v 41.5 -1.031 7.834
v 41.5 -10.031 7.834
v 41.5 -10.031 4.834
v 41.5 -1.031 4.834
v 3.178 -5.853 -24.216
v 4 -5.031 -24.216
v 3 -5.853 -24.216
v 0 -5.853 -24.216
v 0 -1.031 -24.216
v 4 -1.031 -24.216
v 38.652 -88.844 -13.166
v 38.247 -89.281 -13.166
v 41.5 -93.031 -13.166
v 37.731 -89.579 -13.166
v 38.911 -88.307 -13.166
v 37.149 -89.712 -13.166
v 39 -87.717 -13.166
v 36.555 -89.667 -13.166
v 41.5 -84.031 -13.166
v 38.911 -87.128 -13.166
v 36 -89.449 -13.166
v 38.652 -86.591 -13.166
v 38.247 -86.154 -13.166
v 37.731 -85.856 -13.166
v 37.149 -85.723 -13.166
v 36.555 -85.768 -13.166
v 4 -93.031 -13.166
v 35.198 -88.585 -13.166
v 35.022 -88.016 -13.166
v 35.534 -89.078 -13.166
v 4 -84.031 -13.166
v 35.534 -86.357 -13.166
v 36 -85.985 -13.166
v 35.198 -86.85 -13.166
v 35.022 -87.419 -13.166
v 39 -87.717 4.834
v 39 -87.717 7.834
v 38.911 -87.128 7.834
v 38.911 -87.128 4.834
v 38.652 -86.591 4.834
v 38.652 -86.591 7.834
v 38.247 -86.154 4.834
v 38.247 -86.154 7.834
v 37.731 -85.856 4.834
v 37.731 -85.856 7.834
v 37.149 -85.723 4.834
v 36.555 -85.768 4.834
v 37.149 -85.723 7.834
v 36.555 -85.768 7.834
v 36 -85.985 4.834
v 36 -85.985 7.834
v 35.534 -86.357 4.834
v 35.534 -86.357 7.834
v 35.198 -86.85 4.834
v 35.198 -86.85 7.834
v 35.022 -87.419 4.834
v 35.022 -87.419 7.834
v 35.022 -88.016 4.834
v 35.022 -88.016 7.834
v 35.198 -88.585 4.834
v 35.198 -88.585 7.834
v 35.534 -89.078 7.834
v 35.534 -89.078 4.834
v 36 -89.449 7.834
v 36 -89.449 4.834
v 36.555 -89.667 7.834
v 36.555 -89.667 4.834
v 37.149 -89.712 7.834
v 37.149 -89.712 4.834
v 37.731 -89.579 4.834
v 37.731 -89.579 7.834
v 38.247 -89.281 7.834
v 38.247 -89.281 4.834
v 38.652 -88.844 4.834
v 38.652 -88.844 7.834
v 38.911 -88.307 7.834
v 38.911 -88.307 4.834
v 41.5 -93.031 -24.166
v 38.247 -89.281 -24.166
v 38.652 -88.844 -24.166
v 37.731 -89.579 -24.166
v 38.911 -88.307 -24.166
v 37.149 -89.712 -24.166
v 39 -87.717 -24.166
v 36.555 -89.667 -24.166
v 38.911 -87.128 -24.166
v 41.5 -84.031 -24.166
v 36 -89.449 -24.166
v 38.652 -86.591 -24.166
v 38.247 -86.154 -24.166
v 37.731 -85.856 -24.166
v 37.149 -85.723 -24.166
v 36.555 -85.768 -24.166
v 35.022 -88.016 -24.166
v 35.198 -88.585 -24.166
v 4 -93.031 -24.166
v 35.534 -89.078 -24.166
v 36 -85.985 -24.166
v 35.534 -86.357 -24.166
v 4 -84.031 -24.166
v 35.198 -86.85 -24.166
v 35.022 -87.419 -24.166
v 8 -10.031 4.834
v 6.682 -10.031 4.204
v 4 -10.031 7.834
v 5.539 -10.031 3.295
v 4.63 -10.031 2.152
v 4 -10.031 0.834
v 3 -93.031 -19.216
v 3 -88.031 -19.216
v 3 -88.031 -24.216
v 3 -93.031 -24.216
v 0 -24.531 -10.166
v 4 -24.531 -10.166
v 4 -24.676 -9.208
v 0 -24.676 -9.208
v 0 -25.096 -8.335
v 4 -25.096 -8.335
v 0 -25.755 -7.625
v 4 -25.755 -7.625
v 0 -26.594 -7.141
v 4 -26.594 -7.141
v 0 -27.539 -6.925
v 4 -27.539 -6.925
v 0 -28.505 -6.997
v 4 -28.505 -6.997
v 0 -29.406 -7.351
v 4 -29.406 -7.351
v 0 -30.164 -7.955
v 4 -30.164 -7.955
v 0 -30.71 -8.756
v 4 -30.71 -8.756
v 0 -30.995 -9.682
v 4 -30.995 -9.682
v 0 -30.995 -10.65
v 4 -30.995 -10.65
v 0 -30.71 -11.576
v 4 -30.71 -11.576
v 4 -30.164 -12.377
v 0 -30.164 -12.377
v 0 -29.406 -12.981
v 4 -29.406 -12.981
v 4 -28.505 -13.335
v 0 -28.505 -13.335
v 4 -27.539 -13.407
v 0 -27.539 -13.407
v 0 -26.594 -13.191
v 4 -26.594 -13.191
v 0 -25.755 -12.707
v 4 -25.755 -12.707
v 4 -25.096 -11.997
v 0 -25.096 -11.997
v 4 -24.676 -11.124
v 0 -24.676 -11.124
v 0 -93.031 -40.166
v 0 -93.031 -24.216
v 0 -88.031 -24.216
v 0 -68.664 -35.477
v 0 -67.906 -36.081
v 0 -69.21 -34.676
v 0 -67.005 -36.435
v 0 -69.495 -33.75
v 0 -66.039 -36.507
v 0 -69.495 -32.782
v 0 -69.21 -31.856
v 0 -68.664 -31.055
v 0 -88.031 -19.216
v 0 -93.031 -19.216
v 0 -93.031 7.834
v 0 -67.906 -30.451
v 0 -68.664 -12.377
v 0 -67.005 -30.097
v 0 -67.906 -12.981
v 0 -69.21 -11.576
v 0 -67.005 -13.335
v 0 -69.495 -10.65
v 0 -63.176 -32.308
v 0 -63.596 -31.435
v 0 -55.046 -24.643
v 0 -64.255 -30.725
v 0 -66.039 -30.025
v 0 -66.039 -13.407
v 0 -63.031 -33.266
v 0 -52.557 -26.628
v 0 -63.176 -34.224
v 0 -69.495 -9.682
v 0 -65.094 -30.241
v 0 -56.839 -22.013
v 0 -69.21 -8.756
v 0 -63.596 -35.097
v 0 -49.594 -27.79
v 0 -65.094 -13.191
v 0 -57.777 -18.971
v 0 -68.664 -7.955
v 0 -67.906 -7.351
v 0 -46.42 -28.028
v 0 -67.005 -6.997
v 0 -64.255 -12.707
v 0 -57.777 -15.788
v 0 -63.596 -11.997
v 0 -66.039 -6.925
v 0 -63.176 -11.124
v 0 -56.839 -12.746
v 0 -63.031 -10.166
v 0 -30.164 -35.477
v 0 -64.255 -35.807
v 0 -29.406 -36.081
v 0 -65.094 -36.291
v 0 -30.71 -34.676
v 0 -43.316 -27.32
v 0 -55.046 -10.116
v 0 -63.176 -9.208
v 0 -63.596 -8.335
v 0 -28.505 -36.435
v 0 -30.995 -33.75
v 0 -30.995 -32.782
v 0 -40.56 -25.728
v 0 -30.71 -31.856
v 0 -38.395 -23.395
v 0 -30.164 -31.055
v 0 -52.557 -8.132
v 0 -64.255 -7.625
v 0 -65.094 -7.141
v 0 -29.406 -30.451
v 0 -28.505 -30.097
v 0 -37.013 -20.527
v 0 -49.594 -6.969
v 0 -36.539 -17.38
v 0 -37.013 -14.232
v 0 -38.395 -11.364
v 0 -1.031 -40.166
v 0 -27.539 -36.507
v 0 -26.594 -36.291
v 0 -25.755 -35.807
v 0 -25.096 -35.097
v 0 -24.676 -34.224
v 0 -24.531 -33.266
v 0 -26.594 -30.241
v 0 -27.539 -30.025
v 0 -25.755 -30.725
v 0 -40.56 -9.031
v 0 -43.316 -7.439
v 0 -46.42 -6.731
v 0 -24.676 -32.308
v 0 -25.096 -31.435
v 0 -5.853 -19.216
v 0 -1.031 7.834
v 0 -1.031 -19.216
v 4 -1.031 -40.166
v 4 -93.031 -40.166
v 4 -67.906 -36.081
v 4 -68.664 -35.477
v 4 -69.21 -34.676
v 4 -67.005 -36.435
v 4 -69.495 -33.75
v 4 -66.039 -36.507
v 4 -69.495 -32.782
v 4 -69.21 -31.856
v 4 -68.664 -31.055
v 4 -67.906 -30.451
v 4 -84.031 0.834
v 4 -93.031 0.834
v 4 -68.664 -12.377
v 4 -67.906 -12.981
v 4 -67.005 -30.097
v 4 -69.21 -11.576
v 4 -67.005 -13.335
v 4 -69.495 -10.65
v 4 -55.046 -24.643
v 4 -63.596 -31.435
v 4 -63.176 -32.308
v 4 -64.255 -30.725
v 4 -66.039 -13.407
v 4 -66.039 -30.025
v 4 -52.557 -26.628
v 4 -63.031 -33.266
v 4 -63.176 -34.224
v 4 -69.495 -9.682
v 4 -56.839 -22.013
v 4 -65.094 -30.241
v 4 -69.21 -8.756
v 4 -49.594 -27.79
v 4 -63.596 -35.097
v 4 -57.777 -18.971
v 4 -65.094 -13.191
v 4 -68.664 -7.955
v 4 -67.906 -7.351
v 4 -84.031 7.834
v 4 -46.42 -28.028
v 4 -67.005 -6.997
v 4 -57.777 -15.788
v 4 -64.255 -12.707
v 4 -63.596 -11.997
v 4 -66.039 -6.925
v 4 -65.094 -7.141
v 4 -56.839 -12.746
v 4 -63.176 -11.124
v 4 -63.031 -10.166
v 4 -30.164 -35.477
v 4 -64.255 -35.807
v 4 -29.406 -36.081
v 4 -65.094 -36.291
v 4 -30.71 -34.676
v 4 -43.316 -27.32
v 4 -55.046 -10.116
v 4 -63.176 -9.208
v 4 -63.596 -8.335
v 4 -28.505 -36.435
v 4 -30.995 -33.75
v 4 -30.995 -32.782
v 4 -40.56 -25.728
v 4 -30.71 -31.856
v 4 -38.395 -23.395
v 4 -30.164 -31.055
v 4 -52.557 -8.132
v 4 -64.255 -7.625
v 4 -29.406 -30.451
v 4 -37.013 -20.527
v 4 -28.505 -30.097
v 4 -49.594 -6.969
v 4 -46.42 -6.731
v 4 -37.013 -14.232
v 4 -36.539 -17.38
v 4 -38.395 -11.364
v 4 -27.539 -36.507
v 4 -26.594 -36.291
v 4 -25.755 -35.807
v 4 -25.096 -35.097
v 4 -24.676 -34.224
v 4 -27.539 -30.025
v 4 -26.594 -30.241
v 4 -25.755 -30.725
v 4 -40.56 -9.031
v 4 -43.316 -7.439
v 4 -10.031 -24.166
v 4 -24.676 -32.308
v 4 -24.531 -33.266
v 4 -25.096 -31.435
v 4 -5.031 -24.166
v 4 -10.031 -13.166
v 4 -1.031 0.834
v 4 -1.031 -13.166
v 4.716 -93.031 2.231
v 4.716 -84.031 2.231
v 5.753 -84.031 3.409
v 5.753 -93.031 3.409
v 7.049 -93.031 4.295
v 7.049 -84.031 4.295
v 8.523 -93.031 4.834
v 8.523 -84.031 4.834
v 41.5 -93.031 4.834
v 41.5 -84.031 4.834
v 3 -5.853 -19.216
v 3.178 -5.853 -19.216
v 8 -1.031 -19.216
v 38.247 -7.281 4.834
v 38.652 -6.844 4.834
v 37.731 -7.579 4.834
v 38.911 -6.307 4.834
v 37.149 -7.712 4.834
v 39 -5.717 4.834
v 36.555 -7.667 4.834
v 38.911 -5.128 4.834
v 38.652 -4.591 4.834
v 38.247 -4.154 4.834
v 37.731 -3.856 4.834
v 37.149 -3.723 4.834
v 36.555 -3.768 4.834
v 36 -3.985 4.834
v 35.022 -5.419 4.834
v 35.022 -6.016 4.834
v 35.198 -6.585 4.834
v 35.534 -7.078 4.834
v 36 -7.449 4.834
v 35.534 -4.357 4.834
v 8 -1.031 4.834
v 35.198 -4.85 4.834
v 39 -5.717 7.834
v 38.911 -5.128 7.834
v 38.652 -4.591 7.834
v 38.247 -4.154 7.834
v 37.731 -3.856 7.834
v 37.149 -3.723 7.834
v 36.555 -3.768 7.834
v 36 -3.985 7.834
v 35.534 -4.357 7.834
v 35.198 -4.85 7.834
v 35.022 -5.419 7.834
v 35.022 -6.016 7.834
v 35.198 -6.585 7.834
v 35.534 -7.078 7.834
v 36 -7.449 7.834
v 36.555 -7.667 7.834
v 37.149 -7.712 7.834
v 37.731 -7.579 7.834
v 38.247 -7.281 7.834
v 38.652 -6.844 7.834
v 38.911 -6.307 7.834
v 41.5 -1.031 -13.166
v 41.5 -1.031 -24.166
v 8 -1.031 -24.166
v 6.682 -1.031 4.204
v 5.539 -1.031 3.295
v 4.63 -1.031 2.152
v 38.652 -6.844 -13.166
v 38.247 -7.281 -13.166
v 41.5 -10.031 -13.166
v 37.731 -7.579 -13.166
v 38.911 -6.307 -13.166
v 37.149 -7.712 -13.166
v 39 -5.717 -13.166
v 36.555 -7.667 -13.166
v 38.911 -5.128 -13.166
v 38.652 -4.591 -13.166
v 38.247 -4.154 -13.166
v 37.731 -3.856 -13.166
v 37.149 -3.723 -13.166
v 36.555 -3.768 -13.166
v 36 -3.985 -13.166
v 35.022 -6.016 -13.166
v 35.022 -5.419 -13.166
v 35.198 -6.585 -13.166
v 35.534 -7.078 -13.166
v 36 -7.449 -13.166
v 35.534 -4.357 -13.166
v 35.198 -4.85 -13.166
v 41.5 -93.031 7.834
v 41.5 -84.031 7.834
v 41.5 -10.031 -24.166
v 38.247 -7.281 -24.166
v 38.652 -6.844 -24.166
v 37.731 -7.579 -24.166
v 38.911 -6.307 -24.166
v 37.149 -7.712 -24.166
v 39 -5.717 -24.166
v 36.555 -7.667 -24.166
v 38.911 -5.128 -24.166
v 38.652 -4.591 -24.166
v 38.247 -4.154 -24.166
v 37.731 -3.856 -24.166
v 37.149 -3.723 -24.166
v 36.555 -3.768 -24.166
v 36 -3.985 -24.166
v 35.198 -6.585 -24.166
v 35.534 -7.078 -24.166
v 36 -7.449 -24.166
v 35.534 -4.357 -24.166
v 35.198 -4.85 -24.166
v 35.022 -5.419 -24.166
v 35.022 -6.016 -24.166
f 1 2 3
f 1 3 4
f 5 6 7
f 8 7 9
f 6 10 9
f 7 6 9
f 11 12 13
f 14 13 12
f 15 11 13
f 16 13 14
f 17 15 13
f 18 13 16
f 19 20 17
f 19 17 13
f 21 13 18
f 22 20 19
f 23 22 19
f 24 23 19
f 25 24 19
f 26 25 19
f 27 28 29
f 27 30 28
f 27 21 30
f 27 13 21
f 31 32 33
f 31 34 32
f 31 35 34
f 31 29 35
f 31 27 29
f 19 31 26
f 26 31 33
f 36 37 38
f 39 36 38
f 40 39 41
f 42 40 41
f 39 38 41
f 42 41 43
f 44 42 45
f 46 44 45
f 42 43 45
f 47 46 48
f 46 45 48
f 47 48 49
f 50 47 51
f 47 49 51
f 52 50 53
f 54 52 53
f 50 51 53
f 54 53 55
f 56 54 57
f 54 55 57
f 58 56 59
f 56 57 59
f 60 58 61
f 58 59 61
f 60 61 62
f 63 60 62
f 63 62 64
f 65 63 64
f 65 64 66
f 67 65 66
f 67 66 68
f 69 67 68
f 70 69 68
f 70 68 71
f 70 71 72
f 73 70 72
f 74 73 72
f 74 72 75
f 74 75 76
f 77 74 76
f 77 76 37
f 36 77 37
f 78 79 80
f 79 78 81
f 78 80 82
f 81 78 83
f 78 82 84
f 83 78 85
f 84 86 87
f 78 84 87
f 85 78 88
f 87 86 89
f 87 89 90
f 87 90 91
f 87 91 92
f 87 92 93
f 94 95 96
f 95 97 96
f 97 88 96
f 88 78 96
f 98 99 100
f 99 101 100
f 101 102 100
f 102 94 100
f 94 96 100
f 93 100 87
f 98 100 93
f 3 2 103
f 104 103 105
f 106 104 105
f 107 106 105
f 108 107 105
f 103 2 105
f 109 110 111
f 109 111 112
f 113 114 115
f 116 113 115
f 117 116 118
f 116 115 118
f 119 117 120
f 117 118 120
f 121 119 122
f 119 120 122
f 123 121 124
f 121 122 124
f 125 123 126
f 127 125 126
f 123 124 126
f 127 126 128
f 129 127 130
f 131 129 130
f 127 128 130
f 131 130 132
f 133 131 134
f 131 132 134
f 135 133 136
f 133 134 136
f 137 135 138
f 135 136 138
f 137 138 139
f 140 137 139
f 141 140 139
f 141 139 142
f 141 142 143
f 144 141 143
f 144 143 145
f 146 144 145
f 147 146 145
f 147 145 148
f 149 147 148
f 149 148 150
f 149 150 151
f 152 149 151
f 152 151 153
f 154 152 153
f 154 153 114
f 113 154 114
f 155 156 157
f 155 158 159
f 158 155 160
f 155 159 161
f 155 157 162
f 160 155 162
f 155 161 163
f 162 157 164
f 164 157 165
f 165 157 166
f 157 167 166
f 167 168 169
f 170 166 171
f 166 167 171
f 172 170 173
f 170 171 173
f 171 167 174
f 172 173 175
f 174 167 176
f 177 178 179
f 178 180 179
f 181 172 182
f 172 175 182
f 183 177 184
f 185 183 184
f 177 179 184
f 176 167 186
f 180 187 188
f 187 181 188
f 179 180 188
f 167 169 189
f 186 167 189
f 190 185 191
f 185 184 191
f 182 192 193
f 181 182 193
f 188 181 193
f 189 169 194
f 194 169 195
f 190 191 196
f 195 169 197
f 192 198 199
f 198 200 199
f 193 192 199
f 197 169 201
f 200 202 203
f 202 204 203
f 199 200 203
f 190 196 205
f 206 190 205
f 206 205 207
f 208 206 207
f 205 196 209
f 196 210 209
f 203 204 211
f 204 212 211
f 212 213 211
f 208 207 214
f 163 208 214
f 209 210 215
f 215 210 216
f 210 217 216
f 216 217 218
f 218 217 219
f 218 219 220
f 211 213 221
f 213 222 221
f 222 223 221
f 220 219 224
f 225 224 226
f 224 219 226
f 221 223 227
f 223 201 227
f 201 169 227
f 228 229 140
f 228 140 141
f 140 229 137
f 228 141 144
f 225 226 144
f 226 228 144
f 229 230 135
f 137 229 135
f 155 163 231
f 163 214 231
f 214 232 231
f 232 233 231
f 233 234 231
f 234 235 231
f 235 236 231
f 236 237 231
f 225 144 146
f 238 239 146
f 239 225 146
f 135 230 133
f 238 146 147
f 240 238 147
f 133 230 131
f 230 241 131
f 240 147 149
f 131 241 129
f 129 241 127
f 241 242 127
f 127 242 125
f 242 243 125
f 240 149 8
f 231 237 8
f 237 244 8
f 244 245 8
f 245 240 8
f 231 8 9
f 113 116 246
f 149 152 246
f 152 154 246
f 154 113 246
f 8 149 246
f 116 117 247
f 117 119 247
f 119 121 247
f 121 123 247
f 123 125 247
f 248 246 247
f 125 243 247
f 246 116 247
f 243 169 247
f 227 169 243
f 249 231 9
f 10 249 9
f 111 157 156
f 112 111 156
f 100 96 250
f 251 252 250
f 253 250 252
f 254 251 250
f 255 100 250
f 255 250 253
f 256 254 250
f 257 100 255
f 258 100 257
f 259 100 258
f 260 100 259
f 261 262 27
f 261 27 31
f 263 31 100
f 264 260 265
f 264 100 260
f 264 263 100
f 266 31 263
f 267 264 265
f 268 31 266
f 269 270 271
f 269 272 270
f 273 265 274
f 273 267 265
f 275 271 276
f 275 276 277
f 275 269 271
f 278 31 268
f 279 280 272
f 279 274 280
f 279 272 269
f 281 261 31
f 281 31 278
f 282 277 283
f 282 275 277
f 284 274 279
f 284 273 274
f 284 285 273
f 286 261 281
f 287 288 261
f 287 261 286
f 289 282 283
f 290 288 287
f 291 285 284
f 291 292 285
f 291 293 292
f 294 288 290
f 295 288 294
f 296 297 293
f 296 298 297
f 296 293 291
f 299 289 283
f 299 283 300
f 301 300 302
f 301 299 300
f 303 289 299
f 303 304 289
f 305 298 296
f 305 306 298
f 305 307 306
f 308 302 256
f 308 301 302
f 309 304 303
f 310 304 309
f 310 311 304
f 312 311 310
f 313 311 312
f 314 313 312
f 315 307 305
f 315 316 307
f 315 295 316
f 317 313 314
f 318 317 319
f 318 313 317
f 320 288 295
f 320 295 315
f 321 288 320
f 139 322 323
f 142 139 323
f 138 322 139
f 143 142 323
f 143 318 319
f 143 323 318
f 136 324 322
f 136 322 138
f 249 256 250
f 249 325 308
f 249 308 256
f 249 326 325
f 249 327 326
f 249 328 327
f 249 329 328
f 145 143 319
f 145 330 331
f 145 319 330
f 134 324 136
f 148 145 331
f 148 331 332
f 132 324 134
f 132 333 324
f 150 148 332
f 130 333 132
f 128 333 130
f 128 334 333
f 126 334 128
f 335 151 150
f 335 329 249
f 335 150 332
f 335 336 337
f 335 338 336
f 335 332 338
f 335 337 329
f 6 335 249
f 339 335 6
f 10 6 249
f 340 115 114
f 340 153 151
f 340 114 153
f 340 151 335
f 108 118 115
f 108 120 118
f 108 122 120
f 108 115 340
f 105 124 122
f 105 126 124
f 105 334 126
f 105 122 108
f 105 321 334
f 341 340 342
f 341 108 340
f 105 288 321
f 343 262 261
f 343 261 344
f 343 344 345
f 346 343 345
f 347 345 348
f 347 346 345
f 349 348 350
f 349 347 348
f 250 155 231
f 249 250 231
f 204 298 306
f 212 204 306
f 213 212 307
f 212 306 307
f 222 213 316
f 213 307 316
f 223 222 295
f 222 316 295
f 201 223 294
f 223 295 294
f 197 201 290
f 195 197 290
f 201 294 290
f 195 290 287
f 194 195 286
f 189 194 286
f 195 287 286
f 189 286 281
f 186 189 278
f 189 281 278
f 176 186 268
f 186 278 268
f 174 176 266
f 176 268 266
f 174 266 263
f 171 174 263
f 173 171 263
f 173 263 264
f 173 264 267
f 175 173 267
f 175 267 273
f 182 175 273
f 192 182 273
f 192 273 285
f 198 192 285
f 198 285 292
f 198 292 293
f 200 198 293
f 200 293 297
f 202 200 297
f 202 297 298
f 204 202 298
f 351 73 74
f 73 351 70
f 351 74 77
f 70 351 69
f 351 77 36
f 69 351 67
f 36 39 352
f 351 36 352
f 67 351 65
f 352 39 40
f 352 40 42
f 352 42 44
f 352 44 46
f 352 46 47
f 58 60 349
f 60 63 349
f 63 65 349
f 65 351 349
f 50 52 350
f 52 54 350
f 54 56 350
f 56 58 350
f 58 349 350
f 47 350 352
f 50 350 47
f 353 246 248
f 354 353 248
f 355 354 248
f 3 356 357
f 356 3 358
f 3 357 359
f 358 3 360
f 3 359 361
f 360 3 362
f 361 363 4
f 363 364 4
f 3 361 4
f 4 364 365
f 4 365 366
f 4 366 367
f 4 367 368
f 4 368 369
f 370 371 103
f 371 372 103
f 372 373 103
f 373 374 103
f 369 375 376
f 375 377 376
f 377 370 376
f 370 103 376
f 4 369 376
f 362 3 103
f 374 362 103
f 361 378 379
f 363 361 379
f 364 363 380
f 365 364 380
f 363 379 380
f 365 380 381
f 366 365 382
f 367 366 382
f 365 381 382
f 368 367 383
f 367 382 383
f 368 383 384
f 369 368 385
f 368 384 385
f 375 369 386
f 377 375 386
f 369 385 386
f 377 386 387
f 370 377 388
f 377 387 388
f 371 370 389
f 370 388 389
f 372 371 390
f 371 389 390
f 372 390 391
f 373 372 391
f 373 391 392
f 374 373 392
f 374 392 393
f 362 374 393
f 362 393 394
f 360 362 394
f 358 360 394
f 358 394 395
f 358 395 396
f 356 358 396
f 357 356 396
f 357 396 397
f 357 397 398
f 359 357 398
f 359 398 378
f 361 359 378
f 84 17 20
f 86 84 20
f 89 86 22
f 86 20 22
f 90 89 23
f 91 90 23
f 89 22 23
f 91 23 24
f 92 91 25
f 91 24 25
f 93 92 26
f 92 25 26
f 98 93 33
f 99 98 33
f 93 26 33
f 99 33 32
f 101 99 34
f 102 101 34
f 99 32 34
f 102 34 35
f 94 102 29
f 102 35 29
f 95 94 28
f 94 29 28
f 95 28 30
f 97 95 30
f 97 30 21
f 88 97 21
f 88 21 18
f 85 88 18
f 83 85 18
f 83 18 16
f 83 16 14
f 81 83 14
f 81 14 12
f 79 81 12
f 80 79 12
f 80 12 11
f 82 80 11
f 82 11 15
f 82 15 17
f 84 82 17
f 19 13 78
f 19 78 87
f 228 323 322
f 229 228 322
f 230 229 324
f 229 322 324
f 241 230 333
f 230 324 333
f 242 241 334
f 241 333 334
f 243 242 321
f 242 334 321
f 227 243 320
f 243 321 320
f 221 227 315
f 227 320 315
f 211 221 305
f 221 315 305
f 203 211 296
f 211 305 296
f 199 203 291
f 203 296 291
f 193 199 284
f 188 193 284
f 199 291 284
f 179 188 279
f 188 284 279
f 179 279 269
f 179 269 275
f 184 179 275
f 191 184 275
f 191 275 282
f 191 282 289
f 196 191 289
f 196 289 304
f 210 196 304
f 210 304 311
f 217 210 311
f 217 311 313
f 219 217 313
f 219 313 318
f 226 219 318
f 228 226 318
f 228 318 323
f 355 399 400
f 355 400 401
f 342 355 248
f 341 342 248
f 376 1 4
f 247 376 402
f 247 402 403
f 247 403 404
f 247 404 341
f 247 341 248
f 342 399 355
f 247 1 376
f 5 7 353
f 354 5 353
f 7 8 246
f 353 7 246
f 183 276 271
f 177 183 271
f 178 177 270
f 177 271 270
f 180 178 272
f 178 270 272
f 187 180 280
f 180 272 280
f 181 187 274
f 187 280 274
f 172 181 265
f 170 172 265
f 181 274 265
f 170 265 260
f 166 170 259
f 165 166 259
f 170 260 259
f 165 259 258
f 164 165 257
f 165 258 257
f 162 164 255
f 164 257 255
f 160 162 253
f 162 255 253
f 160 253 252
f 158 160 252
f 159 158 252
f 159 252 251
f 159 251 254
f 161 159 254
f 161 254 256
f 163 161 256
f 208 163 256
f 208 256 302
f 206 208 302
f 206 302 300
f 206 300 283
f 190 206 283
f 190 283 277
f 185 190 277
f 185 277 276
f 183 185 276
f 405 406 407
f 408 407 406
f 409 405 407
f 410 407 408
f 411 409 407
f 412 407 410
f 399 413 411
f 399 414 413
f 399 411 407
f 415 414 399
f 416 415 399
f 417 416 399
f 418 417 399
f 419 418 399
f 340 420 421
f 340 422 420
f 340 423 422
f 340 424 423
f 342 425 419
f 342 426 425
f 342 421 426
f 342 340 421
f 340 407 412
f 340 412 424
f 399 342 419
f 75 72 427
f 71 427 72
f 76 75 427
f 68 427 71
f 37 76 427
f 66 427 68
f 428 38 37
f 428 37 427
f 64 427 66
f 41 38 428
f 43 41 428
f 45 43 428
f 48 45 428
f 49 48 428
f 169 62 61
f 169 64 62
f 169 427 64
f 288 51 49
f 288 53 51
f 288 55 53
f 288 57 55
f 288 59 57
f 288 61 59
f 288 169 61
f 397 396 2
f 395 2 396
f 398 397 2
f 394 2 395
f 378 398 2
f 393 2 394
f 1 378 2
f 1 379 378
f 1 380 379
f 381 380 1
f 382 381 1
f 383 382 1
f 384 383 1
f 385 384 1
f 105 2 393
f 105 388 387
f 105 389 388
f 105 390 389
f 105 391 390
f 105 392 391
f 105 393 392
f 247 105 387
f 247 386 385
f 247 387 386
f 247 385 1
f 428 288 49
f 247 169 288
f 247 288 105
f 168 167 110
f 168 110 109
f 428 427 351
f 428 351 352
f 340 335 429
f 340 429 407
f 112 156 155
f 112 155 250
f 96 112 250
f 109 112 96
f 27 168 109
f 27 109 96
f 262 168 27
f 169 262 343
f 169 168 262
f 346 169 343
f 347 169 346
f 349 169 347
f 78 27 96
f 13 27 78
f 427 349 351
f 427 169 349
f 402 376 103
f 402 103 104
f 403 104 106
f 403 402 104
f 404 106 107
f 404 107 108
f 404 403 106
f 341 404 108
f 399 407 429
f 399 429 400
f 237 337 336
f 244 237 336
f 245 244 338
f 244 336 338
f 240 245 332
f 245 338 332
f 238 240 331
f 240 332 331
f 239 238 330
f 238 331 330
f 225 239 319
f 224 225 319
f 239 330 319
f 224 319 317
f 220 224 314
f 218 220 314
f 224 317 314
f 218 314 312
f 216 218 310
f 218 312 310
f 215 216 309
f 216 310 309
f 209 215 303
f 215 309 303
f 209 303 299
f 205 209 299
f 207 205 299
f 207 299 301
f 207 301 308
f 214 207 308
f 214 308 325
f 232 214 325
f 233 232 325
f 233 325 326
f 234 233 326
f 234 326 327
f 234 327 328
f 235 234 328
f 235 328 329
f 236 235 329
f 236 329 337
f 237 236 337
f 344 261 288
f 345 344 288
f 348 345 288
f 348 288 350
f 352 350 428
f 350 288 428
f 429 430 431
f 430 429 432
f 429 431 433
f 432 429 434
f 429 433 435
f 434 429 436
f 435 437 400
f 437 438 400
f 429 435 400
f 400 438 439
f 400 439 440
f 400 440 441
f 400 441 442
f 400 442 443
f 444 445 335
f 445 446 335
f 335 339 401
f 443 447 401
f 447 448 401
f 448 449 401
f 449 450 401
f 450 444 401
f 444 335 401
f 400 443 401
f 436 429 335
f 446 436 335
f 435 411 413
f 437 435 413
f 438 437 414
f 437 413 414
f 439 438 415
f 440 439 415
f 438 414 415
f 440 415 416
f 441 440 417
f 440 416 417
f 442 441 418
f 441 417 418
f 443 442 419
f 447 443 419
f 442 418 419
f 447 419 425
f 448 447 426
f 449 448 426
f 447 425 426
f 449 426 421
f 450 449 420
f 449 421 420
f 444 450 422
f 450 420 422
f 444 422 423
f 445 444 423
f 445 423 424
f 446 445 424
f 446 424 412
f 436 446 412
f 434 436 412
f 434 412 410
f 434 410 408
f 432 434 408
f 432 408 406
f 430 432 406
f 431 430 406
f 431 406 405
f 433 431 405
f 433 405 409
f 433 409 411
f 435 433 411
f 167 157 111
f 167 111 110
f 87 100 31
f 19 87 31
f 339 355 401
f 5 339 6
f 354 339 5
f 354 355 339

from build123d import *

# Parameters (mm, degrees)
F0_W         = 92
F0_H         = 48
F1_DEPTH     = 4
F2_R         = 3.25
F2_R_2       = 10.6786712851
F3_DEPTH     = 25
F4_W         = 9
F4_H         = 11
F4_H_2       = 3
F5_DEPTH     = 37.5
F6_R         = 2
F7_DEPTH     = 40
F8_W         = 0.1783174183
F8_H         = 5
F8_W_2       = 4.8216825817
F8_W_3       = 5
F9_DEPTH     = 3
F10_T4_DEPTH = 5
F12_DEPTH    = 9
F14_DEPTH    = 9


# Not quite as in the source:
# - a fillet or chamfer that OpenCascade refuses, or shapes differently, is made with other operations: its cross-section is extruded or revolved along the edge and cut away or added


with BuildPart() as f1:
    # F0 (on Right) → F1 (new body)
    with BuildSketch(Plane.YZ):
        with Locations((-47.0313817766, -16.1659868658)):
            Rectangle(F0_W, F0_H)
    extrude(amount=F1_DEPTH)

    # F2 (on face) → F3 (cut)
    with BuildSketch(Plane.YZ.offset(4)):
        with Locations((-66.2813817766, -10.1659868658)):
            Circle(F2_R)
        with Locations((-27.7813817766, -10.1659868658)):
            Circle(F2_R)
        with Locations((-66.2813817766, -33.2659868658)):
            Circle(F2_R)
        with Locations((-27.7813817766, -33.2659868658)):
            Circle(F2_R)
        with Locations((-47.217734158, -17.3795577139)):
            Circle(F2_R_2)
    extrude(amount=-F3_DEPTH, mode=Mode.SUBTRACT)

    # F4 (on face) → F5 (join)
    with BuildSketch(Plane.YZ.offset(4)):
        with Locations((-88.5313817766, -18.6659868658)):
            Rectangle(F4_W, F4_H)
        with Locations((-5.5313817766, -18.6659868658)):
            Rectangle(F4_W, F4_H)
        with Locations((-88.5313817766, 6.3340131342)):
            Rectangle(F4_W, F4_H_2)
        with Locations((-5.5313817766, 6.3340131342)):
            Rectangle(F4_W, F4_H_2)
    extrude(amount=F5_DEPTH)

    # F6 (on face) → F7 (cut)
    with BuildSketch(Plane.XY.offset(7.8340131342)):
        with Locations((37, -5.7174442336)):
            Circle(F6_R)
        with Locations((37, -87.7174442336)):
            Circle(F6_R)
    extrude(amount=-F7_DEPTH, mode=Mode.SUBTRACT)

    # F8 (on face) → F9 (cut)
    with BuildSketch(Plane(origin=(0, 0, 0), x_dir=(0, -1, 0), z_dir=(-1, 0, 0))):
        with Locations((0.9422230674, -21.7159868658)):
            Rectangle(F8_W, F8_H)
        with Locations((3.4422230674, -21.7159868658)):
            Rectangle(F8_W_2, F8_H)
        with Locations((90.5313817766, -21.7159868658)):
            Rectangle(F8_W_3, F8_H)
    extrude(amount=-F9_DEPTH, mode=Mode.SUBTRACT)

    # F10: chamfer of 5 on 1 edges, made by hand


with BuildPart() as f10_tool2:
    # F10_s3 → F10_t4 (new body)
    with BuildSketch(Plane.XY.offset(-19.2159868658)):
        Polygon((8, -1.0313817766), (3, -6.0313817766), (3, -1.0313817766), align=None)
    extrude(amount=-F10_T4_DEPTH)

    split(bisect_by=Plane.XZ.offset(5.8530643582), keep=Keep.BOTTOM)


with BuildPart() as f1_1:
    add(f1.part)

    # F10_t1: cut F10_tool2
    add(f10_tool2.part, mode=Mode.SUBTRACT)

    # F11 (on face) → F12 (join)
    with BuildSketch(Plane(origin=(0, -1.0313817766, 0), x_dir=(-1, 0, 0), z_dir=(0, 1, 0))):
        with BuildLine():
            ThreePointArc((-8, 4.8340131342), (-5.539111548, 3.2949015862), (-4, 0.8340131342))
            Line((-4, 0.8340131342), (-4, 4.8340131342))
            Line((-4, 4.8340131342), (-8, 4.8340131342))
        make_face()
    extrude(amount=-F12_DEPTH)

    # F13 (on face) → F14 (join)
    with BuildSketch(Plane.XZ.offset(93.0313817766)):
        with BuildLine():
            ThreePointArc((4, 0.8340131342), (5.7533122895, 3.408733727), (8.5231261328, 4.8340131342))
            Line((8.5231261328, 4.8340131342), (4, 4.8340131342))
            Line((4, 4.8340131342), (4, 0.8340131342))
        make_face()
    extrude(amount=-F14_DEPTH)


solid = f1_1.part
